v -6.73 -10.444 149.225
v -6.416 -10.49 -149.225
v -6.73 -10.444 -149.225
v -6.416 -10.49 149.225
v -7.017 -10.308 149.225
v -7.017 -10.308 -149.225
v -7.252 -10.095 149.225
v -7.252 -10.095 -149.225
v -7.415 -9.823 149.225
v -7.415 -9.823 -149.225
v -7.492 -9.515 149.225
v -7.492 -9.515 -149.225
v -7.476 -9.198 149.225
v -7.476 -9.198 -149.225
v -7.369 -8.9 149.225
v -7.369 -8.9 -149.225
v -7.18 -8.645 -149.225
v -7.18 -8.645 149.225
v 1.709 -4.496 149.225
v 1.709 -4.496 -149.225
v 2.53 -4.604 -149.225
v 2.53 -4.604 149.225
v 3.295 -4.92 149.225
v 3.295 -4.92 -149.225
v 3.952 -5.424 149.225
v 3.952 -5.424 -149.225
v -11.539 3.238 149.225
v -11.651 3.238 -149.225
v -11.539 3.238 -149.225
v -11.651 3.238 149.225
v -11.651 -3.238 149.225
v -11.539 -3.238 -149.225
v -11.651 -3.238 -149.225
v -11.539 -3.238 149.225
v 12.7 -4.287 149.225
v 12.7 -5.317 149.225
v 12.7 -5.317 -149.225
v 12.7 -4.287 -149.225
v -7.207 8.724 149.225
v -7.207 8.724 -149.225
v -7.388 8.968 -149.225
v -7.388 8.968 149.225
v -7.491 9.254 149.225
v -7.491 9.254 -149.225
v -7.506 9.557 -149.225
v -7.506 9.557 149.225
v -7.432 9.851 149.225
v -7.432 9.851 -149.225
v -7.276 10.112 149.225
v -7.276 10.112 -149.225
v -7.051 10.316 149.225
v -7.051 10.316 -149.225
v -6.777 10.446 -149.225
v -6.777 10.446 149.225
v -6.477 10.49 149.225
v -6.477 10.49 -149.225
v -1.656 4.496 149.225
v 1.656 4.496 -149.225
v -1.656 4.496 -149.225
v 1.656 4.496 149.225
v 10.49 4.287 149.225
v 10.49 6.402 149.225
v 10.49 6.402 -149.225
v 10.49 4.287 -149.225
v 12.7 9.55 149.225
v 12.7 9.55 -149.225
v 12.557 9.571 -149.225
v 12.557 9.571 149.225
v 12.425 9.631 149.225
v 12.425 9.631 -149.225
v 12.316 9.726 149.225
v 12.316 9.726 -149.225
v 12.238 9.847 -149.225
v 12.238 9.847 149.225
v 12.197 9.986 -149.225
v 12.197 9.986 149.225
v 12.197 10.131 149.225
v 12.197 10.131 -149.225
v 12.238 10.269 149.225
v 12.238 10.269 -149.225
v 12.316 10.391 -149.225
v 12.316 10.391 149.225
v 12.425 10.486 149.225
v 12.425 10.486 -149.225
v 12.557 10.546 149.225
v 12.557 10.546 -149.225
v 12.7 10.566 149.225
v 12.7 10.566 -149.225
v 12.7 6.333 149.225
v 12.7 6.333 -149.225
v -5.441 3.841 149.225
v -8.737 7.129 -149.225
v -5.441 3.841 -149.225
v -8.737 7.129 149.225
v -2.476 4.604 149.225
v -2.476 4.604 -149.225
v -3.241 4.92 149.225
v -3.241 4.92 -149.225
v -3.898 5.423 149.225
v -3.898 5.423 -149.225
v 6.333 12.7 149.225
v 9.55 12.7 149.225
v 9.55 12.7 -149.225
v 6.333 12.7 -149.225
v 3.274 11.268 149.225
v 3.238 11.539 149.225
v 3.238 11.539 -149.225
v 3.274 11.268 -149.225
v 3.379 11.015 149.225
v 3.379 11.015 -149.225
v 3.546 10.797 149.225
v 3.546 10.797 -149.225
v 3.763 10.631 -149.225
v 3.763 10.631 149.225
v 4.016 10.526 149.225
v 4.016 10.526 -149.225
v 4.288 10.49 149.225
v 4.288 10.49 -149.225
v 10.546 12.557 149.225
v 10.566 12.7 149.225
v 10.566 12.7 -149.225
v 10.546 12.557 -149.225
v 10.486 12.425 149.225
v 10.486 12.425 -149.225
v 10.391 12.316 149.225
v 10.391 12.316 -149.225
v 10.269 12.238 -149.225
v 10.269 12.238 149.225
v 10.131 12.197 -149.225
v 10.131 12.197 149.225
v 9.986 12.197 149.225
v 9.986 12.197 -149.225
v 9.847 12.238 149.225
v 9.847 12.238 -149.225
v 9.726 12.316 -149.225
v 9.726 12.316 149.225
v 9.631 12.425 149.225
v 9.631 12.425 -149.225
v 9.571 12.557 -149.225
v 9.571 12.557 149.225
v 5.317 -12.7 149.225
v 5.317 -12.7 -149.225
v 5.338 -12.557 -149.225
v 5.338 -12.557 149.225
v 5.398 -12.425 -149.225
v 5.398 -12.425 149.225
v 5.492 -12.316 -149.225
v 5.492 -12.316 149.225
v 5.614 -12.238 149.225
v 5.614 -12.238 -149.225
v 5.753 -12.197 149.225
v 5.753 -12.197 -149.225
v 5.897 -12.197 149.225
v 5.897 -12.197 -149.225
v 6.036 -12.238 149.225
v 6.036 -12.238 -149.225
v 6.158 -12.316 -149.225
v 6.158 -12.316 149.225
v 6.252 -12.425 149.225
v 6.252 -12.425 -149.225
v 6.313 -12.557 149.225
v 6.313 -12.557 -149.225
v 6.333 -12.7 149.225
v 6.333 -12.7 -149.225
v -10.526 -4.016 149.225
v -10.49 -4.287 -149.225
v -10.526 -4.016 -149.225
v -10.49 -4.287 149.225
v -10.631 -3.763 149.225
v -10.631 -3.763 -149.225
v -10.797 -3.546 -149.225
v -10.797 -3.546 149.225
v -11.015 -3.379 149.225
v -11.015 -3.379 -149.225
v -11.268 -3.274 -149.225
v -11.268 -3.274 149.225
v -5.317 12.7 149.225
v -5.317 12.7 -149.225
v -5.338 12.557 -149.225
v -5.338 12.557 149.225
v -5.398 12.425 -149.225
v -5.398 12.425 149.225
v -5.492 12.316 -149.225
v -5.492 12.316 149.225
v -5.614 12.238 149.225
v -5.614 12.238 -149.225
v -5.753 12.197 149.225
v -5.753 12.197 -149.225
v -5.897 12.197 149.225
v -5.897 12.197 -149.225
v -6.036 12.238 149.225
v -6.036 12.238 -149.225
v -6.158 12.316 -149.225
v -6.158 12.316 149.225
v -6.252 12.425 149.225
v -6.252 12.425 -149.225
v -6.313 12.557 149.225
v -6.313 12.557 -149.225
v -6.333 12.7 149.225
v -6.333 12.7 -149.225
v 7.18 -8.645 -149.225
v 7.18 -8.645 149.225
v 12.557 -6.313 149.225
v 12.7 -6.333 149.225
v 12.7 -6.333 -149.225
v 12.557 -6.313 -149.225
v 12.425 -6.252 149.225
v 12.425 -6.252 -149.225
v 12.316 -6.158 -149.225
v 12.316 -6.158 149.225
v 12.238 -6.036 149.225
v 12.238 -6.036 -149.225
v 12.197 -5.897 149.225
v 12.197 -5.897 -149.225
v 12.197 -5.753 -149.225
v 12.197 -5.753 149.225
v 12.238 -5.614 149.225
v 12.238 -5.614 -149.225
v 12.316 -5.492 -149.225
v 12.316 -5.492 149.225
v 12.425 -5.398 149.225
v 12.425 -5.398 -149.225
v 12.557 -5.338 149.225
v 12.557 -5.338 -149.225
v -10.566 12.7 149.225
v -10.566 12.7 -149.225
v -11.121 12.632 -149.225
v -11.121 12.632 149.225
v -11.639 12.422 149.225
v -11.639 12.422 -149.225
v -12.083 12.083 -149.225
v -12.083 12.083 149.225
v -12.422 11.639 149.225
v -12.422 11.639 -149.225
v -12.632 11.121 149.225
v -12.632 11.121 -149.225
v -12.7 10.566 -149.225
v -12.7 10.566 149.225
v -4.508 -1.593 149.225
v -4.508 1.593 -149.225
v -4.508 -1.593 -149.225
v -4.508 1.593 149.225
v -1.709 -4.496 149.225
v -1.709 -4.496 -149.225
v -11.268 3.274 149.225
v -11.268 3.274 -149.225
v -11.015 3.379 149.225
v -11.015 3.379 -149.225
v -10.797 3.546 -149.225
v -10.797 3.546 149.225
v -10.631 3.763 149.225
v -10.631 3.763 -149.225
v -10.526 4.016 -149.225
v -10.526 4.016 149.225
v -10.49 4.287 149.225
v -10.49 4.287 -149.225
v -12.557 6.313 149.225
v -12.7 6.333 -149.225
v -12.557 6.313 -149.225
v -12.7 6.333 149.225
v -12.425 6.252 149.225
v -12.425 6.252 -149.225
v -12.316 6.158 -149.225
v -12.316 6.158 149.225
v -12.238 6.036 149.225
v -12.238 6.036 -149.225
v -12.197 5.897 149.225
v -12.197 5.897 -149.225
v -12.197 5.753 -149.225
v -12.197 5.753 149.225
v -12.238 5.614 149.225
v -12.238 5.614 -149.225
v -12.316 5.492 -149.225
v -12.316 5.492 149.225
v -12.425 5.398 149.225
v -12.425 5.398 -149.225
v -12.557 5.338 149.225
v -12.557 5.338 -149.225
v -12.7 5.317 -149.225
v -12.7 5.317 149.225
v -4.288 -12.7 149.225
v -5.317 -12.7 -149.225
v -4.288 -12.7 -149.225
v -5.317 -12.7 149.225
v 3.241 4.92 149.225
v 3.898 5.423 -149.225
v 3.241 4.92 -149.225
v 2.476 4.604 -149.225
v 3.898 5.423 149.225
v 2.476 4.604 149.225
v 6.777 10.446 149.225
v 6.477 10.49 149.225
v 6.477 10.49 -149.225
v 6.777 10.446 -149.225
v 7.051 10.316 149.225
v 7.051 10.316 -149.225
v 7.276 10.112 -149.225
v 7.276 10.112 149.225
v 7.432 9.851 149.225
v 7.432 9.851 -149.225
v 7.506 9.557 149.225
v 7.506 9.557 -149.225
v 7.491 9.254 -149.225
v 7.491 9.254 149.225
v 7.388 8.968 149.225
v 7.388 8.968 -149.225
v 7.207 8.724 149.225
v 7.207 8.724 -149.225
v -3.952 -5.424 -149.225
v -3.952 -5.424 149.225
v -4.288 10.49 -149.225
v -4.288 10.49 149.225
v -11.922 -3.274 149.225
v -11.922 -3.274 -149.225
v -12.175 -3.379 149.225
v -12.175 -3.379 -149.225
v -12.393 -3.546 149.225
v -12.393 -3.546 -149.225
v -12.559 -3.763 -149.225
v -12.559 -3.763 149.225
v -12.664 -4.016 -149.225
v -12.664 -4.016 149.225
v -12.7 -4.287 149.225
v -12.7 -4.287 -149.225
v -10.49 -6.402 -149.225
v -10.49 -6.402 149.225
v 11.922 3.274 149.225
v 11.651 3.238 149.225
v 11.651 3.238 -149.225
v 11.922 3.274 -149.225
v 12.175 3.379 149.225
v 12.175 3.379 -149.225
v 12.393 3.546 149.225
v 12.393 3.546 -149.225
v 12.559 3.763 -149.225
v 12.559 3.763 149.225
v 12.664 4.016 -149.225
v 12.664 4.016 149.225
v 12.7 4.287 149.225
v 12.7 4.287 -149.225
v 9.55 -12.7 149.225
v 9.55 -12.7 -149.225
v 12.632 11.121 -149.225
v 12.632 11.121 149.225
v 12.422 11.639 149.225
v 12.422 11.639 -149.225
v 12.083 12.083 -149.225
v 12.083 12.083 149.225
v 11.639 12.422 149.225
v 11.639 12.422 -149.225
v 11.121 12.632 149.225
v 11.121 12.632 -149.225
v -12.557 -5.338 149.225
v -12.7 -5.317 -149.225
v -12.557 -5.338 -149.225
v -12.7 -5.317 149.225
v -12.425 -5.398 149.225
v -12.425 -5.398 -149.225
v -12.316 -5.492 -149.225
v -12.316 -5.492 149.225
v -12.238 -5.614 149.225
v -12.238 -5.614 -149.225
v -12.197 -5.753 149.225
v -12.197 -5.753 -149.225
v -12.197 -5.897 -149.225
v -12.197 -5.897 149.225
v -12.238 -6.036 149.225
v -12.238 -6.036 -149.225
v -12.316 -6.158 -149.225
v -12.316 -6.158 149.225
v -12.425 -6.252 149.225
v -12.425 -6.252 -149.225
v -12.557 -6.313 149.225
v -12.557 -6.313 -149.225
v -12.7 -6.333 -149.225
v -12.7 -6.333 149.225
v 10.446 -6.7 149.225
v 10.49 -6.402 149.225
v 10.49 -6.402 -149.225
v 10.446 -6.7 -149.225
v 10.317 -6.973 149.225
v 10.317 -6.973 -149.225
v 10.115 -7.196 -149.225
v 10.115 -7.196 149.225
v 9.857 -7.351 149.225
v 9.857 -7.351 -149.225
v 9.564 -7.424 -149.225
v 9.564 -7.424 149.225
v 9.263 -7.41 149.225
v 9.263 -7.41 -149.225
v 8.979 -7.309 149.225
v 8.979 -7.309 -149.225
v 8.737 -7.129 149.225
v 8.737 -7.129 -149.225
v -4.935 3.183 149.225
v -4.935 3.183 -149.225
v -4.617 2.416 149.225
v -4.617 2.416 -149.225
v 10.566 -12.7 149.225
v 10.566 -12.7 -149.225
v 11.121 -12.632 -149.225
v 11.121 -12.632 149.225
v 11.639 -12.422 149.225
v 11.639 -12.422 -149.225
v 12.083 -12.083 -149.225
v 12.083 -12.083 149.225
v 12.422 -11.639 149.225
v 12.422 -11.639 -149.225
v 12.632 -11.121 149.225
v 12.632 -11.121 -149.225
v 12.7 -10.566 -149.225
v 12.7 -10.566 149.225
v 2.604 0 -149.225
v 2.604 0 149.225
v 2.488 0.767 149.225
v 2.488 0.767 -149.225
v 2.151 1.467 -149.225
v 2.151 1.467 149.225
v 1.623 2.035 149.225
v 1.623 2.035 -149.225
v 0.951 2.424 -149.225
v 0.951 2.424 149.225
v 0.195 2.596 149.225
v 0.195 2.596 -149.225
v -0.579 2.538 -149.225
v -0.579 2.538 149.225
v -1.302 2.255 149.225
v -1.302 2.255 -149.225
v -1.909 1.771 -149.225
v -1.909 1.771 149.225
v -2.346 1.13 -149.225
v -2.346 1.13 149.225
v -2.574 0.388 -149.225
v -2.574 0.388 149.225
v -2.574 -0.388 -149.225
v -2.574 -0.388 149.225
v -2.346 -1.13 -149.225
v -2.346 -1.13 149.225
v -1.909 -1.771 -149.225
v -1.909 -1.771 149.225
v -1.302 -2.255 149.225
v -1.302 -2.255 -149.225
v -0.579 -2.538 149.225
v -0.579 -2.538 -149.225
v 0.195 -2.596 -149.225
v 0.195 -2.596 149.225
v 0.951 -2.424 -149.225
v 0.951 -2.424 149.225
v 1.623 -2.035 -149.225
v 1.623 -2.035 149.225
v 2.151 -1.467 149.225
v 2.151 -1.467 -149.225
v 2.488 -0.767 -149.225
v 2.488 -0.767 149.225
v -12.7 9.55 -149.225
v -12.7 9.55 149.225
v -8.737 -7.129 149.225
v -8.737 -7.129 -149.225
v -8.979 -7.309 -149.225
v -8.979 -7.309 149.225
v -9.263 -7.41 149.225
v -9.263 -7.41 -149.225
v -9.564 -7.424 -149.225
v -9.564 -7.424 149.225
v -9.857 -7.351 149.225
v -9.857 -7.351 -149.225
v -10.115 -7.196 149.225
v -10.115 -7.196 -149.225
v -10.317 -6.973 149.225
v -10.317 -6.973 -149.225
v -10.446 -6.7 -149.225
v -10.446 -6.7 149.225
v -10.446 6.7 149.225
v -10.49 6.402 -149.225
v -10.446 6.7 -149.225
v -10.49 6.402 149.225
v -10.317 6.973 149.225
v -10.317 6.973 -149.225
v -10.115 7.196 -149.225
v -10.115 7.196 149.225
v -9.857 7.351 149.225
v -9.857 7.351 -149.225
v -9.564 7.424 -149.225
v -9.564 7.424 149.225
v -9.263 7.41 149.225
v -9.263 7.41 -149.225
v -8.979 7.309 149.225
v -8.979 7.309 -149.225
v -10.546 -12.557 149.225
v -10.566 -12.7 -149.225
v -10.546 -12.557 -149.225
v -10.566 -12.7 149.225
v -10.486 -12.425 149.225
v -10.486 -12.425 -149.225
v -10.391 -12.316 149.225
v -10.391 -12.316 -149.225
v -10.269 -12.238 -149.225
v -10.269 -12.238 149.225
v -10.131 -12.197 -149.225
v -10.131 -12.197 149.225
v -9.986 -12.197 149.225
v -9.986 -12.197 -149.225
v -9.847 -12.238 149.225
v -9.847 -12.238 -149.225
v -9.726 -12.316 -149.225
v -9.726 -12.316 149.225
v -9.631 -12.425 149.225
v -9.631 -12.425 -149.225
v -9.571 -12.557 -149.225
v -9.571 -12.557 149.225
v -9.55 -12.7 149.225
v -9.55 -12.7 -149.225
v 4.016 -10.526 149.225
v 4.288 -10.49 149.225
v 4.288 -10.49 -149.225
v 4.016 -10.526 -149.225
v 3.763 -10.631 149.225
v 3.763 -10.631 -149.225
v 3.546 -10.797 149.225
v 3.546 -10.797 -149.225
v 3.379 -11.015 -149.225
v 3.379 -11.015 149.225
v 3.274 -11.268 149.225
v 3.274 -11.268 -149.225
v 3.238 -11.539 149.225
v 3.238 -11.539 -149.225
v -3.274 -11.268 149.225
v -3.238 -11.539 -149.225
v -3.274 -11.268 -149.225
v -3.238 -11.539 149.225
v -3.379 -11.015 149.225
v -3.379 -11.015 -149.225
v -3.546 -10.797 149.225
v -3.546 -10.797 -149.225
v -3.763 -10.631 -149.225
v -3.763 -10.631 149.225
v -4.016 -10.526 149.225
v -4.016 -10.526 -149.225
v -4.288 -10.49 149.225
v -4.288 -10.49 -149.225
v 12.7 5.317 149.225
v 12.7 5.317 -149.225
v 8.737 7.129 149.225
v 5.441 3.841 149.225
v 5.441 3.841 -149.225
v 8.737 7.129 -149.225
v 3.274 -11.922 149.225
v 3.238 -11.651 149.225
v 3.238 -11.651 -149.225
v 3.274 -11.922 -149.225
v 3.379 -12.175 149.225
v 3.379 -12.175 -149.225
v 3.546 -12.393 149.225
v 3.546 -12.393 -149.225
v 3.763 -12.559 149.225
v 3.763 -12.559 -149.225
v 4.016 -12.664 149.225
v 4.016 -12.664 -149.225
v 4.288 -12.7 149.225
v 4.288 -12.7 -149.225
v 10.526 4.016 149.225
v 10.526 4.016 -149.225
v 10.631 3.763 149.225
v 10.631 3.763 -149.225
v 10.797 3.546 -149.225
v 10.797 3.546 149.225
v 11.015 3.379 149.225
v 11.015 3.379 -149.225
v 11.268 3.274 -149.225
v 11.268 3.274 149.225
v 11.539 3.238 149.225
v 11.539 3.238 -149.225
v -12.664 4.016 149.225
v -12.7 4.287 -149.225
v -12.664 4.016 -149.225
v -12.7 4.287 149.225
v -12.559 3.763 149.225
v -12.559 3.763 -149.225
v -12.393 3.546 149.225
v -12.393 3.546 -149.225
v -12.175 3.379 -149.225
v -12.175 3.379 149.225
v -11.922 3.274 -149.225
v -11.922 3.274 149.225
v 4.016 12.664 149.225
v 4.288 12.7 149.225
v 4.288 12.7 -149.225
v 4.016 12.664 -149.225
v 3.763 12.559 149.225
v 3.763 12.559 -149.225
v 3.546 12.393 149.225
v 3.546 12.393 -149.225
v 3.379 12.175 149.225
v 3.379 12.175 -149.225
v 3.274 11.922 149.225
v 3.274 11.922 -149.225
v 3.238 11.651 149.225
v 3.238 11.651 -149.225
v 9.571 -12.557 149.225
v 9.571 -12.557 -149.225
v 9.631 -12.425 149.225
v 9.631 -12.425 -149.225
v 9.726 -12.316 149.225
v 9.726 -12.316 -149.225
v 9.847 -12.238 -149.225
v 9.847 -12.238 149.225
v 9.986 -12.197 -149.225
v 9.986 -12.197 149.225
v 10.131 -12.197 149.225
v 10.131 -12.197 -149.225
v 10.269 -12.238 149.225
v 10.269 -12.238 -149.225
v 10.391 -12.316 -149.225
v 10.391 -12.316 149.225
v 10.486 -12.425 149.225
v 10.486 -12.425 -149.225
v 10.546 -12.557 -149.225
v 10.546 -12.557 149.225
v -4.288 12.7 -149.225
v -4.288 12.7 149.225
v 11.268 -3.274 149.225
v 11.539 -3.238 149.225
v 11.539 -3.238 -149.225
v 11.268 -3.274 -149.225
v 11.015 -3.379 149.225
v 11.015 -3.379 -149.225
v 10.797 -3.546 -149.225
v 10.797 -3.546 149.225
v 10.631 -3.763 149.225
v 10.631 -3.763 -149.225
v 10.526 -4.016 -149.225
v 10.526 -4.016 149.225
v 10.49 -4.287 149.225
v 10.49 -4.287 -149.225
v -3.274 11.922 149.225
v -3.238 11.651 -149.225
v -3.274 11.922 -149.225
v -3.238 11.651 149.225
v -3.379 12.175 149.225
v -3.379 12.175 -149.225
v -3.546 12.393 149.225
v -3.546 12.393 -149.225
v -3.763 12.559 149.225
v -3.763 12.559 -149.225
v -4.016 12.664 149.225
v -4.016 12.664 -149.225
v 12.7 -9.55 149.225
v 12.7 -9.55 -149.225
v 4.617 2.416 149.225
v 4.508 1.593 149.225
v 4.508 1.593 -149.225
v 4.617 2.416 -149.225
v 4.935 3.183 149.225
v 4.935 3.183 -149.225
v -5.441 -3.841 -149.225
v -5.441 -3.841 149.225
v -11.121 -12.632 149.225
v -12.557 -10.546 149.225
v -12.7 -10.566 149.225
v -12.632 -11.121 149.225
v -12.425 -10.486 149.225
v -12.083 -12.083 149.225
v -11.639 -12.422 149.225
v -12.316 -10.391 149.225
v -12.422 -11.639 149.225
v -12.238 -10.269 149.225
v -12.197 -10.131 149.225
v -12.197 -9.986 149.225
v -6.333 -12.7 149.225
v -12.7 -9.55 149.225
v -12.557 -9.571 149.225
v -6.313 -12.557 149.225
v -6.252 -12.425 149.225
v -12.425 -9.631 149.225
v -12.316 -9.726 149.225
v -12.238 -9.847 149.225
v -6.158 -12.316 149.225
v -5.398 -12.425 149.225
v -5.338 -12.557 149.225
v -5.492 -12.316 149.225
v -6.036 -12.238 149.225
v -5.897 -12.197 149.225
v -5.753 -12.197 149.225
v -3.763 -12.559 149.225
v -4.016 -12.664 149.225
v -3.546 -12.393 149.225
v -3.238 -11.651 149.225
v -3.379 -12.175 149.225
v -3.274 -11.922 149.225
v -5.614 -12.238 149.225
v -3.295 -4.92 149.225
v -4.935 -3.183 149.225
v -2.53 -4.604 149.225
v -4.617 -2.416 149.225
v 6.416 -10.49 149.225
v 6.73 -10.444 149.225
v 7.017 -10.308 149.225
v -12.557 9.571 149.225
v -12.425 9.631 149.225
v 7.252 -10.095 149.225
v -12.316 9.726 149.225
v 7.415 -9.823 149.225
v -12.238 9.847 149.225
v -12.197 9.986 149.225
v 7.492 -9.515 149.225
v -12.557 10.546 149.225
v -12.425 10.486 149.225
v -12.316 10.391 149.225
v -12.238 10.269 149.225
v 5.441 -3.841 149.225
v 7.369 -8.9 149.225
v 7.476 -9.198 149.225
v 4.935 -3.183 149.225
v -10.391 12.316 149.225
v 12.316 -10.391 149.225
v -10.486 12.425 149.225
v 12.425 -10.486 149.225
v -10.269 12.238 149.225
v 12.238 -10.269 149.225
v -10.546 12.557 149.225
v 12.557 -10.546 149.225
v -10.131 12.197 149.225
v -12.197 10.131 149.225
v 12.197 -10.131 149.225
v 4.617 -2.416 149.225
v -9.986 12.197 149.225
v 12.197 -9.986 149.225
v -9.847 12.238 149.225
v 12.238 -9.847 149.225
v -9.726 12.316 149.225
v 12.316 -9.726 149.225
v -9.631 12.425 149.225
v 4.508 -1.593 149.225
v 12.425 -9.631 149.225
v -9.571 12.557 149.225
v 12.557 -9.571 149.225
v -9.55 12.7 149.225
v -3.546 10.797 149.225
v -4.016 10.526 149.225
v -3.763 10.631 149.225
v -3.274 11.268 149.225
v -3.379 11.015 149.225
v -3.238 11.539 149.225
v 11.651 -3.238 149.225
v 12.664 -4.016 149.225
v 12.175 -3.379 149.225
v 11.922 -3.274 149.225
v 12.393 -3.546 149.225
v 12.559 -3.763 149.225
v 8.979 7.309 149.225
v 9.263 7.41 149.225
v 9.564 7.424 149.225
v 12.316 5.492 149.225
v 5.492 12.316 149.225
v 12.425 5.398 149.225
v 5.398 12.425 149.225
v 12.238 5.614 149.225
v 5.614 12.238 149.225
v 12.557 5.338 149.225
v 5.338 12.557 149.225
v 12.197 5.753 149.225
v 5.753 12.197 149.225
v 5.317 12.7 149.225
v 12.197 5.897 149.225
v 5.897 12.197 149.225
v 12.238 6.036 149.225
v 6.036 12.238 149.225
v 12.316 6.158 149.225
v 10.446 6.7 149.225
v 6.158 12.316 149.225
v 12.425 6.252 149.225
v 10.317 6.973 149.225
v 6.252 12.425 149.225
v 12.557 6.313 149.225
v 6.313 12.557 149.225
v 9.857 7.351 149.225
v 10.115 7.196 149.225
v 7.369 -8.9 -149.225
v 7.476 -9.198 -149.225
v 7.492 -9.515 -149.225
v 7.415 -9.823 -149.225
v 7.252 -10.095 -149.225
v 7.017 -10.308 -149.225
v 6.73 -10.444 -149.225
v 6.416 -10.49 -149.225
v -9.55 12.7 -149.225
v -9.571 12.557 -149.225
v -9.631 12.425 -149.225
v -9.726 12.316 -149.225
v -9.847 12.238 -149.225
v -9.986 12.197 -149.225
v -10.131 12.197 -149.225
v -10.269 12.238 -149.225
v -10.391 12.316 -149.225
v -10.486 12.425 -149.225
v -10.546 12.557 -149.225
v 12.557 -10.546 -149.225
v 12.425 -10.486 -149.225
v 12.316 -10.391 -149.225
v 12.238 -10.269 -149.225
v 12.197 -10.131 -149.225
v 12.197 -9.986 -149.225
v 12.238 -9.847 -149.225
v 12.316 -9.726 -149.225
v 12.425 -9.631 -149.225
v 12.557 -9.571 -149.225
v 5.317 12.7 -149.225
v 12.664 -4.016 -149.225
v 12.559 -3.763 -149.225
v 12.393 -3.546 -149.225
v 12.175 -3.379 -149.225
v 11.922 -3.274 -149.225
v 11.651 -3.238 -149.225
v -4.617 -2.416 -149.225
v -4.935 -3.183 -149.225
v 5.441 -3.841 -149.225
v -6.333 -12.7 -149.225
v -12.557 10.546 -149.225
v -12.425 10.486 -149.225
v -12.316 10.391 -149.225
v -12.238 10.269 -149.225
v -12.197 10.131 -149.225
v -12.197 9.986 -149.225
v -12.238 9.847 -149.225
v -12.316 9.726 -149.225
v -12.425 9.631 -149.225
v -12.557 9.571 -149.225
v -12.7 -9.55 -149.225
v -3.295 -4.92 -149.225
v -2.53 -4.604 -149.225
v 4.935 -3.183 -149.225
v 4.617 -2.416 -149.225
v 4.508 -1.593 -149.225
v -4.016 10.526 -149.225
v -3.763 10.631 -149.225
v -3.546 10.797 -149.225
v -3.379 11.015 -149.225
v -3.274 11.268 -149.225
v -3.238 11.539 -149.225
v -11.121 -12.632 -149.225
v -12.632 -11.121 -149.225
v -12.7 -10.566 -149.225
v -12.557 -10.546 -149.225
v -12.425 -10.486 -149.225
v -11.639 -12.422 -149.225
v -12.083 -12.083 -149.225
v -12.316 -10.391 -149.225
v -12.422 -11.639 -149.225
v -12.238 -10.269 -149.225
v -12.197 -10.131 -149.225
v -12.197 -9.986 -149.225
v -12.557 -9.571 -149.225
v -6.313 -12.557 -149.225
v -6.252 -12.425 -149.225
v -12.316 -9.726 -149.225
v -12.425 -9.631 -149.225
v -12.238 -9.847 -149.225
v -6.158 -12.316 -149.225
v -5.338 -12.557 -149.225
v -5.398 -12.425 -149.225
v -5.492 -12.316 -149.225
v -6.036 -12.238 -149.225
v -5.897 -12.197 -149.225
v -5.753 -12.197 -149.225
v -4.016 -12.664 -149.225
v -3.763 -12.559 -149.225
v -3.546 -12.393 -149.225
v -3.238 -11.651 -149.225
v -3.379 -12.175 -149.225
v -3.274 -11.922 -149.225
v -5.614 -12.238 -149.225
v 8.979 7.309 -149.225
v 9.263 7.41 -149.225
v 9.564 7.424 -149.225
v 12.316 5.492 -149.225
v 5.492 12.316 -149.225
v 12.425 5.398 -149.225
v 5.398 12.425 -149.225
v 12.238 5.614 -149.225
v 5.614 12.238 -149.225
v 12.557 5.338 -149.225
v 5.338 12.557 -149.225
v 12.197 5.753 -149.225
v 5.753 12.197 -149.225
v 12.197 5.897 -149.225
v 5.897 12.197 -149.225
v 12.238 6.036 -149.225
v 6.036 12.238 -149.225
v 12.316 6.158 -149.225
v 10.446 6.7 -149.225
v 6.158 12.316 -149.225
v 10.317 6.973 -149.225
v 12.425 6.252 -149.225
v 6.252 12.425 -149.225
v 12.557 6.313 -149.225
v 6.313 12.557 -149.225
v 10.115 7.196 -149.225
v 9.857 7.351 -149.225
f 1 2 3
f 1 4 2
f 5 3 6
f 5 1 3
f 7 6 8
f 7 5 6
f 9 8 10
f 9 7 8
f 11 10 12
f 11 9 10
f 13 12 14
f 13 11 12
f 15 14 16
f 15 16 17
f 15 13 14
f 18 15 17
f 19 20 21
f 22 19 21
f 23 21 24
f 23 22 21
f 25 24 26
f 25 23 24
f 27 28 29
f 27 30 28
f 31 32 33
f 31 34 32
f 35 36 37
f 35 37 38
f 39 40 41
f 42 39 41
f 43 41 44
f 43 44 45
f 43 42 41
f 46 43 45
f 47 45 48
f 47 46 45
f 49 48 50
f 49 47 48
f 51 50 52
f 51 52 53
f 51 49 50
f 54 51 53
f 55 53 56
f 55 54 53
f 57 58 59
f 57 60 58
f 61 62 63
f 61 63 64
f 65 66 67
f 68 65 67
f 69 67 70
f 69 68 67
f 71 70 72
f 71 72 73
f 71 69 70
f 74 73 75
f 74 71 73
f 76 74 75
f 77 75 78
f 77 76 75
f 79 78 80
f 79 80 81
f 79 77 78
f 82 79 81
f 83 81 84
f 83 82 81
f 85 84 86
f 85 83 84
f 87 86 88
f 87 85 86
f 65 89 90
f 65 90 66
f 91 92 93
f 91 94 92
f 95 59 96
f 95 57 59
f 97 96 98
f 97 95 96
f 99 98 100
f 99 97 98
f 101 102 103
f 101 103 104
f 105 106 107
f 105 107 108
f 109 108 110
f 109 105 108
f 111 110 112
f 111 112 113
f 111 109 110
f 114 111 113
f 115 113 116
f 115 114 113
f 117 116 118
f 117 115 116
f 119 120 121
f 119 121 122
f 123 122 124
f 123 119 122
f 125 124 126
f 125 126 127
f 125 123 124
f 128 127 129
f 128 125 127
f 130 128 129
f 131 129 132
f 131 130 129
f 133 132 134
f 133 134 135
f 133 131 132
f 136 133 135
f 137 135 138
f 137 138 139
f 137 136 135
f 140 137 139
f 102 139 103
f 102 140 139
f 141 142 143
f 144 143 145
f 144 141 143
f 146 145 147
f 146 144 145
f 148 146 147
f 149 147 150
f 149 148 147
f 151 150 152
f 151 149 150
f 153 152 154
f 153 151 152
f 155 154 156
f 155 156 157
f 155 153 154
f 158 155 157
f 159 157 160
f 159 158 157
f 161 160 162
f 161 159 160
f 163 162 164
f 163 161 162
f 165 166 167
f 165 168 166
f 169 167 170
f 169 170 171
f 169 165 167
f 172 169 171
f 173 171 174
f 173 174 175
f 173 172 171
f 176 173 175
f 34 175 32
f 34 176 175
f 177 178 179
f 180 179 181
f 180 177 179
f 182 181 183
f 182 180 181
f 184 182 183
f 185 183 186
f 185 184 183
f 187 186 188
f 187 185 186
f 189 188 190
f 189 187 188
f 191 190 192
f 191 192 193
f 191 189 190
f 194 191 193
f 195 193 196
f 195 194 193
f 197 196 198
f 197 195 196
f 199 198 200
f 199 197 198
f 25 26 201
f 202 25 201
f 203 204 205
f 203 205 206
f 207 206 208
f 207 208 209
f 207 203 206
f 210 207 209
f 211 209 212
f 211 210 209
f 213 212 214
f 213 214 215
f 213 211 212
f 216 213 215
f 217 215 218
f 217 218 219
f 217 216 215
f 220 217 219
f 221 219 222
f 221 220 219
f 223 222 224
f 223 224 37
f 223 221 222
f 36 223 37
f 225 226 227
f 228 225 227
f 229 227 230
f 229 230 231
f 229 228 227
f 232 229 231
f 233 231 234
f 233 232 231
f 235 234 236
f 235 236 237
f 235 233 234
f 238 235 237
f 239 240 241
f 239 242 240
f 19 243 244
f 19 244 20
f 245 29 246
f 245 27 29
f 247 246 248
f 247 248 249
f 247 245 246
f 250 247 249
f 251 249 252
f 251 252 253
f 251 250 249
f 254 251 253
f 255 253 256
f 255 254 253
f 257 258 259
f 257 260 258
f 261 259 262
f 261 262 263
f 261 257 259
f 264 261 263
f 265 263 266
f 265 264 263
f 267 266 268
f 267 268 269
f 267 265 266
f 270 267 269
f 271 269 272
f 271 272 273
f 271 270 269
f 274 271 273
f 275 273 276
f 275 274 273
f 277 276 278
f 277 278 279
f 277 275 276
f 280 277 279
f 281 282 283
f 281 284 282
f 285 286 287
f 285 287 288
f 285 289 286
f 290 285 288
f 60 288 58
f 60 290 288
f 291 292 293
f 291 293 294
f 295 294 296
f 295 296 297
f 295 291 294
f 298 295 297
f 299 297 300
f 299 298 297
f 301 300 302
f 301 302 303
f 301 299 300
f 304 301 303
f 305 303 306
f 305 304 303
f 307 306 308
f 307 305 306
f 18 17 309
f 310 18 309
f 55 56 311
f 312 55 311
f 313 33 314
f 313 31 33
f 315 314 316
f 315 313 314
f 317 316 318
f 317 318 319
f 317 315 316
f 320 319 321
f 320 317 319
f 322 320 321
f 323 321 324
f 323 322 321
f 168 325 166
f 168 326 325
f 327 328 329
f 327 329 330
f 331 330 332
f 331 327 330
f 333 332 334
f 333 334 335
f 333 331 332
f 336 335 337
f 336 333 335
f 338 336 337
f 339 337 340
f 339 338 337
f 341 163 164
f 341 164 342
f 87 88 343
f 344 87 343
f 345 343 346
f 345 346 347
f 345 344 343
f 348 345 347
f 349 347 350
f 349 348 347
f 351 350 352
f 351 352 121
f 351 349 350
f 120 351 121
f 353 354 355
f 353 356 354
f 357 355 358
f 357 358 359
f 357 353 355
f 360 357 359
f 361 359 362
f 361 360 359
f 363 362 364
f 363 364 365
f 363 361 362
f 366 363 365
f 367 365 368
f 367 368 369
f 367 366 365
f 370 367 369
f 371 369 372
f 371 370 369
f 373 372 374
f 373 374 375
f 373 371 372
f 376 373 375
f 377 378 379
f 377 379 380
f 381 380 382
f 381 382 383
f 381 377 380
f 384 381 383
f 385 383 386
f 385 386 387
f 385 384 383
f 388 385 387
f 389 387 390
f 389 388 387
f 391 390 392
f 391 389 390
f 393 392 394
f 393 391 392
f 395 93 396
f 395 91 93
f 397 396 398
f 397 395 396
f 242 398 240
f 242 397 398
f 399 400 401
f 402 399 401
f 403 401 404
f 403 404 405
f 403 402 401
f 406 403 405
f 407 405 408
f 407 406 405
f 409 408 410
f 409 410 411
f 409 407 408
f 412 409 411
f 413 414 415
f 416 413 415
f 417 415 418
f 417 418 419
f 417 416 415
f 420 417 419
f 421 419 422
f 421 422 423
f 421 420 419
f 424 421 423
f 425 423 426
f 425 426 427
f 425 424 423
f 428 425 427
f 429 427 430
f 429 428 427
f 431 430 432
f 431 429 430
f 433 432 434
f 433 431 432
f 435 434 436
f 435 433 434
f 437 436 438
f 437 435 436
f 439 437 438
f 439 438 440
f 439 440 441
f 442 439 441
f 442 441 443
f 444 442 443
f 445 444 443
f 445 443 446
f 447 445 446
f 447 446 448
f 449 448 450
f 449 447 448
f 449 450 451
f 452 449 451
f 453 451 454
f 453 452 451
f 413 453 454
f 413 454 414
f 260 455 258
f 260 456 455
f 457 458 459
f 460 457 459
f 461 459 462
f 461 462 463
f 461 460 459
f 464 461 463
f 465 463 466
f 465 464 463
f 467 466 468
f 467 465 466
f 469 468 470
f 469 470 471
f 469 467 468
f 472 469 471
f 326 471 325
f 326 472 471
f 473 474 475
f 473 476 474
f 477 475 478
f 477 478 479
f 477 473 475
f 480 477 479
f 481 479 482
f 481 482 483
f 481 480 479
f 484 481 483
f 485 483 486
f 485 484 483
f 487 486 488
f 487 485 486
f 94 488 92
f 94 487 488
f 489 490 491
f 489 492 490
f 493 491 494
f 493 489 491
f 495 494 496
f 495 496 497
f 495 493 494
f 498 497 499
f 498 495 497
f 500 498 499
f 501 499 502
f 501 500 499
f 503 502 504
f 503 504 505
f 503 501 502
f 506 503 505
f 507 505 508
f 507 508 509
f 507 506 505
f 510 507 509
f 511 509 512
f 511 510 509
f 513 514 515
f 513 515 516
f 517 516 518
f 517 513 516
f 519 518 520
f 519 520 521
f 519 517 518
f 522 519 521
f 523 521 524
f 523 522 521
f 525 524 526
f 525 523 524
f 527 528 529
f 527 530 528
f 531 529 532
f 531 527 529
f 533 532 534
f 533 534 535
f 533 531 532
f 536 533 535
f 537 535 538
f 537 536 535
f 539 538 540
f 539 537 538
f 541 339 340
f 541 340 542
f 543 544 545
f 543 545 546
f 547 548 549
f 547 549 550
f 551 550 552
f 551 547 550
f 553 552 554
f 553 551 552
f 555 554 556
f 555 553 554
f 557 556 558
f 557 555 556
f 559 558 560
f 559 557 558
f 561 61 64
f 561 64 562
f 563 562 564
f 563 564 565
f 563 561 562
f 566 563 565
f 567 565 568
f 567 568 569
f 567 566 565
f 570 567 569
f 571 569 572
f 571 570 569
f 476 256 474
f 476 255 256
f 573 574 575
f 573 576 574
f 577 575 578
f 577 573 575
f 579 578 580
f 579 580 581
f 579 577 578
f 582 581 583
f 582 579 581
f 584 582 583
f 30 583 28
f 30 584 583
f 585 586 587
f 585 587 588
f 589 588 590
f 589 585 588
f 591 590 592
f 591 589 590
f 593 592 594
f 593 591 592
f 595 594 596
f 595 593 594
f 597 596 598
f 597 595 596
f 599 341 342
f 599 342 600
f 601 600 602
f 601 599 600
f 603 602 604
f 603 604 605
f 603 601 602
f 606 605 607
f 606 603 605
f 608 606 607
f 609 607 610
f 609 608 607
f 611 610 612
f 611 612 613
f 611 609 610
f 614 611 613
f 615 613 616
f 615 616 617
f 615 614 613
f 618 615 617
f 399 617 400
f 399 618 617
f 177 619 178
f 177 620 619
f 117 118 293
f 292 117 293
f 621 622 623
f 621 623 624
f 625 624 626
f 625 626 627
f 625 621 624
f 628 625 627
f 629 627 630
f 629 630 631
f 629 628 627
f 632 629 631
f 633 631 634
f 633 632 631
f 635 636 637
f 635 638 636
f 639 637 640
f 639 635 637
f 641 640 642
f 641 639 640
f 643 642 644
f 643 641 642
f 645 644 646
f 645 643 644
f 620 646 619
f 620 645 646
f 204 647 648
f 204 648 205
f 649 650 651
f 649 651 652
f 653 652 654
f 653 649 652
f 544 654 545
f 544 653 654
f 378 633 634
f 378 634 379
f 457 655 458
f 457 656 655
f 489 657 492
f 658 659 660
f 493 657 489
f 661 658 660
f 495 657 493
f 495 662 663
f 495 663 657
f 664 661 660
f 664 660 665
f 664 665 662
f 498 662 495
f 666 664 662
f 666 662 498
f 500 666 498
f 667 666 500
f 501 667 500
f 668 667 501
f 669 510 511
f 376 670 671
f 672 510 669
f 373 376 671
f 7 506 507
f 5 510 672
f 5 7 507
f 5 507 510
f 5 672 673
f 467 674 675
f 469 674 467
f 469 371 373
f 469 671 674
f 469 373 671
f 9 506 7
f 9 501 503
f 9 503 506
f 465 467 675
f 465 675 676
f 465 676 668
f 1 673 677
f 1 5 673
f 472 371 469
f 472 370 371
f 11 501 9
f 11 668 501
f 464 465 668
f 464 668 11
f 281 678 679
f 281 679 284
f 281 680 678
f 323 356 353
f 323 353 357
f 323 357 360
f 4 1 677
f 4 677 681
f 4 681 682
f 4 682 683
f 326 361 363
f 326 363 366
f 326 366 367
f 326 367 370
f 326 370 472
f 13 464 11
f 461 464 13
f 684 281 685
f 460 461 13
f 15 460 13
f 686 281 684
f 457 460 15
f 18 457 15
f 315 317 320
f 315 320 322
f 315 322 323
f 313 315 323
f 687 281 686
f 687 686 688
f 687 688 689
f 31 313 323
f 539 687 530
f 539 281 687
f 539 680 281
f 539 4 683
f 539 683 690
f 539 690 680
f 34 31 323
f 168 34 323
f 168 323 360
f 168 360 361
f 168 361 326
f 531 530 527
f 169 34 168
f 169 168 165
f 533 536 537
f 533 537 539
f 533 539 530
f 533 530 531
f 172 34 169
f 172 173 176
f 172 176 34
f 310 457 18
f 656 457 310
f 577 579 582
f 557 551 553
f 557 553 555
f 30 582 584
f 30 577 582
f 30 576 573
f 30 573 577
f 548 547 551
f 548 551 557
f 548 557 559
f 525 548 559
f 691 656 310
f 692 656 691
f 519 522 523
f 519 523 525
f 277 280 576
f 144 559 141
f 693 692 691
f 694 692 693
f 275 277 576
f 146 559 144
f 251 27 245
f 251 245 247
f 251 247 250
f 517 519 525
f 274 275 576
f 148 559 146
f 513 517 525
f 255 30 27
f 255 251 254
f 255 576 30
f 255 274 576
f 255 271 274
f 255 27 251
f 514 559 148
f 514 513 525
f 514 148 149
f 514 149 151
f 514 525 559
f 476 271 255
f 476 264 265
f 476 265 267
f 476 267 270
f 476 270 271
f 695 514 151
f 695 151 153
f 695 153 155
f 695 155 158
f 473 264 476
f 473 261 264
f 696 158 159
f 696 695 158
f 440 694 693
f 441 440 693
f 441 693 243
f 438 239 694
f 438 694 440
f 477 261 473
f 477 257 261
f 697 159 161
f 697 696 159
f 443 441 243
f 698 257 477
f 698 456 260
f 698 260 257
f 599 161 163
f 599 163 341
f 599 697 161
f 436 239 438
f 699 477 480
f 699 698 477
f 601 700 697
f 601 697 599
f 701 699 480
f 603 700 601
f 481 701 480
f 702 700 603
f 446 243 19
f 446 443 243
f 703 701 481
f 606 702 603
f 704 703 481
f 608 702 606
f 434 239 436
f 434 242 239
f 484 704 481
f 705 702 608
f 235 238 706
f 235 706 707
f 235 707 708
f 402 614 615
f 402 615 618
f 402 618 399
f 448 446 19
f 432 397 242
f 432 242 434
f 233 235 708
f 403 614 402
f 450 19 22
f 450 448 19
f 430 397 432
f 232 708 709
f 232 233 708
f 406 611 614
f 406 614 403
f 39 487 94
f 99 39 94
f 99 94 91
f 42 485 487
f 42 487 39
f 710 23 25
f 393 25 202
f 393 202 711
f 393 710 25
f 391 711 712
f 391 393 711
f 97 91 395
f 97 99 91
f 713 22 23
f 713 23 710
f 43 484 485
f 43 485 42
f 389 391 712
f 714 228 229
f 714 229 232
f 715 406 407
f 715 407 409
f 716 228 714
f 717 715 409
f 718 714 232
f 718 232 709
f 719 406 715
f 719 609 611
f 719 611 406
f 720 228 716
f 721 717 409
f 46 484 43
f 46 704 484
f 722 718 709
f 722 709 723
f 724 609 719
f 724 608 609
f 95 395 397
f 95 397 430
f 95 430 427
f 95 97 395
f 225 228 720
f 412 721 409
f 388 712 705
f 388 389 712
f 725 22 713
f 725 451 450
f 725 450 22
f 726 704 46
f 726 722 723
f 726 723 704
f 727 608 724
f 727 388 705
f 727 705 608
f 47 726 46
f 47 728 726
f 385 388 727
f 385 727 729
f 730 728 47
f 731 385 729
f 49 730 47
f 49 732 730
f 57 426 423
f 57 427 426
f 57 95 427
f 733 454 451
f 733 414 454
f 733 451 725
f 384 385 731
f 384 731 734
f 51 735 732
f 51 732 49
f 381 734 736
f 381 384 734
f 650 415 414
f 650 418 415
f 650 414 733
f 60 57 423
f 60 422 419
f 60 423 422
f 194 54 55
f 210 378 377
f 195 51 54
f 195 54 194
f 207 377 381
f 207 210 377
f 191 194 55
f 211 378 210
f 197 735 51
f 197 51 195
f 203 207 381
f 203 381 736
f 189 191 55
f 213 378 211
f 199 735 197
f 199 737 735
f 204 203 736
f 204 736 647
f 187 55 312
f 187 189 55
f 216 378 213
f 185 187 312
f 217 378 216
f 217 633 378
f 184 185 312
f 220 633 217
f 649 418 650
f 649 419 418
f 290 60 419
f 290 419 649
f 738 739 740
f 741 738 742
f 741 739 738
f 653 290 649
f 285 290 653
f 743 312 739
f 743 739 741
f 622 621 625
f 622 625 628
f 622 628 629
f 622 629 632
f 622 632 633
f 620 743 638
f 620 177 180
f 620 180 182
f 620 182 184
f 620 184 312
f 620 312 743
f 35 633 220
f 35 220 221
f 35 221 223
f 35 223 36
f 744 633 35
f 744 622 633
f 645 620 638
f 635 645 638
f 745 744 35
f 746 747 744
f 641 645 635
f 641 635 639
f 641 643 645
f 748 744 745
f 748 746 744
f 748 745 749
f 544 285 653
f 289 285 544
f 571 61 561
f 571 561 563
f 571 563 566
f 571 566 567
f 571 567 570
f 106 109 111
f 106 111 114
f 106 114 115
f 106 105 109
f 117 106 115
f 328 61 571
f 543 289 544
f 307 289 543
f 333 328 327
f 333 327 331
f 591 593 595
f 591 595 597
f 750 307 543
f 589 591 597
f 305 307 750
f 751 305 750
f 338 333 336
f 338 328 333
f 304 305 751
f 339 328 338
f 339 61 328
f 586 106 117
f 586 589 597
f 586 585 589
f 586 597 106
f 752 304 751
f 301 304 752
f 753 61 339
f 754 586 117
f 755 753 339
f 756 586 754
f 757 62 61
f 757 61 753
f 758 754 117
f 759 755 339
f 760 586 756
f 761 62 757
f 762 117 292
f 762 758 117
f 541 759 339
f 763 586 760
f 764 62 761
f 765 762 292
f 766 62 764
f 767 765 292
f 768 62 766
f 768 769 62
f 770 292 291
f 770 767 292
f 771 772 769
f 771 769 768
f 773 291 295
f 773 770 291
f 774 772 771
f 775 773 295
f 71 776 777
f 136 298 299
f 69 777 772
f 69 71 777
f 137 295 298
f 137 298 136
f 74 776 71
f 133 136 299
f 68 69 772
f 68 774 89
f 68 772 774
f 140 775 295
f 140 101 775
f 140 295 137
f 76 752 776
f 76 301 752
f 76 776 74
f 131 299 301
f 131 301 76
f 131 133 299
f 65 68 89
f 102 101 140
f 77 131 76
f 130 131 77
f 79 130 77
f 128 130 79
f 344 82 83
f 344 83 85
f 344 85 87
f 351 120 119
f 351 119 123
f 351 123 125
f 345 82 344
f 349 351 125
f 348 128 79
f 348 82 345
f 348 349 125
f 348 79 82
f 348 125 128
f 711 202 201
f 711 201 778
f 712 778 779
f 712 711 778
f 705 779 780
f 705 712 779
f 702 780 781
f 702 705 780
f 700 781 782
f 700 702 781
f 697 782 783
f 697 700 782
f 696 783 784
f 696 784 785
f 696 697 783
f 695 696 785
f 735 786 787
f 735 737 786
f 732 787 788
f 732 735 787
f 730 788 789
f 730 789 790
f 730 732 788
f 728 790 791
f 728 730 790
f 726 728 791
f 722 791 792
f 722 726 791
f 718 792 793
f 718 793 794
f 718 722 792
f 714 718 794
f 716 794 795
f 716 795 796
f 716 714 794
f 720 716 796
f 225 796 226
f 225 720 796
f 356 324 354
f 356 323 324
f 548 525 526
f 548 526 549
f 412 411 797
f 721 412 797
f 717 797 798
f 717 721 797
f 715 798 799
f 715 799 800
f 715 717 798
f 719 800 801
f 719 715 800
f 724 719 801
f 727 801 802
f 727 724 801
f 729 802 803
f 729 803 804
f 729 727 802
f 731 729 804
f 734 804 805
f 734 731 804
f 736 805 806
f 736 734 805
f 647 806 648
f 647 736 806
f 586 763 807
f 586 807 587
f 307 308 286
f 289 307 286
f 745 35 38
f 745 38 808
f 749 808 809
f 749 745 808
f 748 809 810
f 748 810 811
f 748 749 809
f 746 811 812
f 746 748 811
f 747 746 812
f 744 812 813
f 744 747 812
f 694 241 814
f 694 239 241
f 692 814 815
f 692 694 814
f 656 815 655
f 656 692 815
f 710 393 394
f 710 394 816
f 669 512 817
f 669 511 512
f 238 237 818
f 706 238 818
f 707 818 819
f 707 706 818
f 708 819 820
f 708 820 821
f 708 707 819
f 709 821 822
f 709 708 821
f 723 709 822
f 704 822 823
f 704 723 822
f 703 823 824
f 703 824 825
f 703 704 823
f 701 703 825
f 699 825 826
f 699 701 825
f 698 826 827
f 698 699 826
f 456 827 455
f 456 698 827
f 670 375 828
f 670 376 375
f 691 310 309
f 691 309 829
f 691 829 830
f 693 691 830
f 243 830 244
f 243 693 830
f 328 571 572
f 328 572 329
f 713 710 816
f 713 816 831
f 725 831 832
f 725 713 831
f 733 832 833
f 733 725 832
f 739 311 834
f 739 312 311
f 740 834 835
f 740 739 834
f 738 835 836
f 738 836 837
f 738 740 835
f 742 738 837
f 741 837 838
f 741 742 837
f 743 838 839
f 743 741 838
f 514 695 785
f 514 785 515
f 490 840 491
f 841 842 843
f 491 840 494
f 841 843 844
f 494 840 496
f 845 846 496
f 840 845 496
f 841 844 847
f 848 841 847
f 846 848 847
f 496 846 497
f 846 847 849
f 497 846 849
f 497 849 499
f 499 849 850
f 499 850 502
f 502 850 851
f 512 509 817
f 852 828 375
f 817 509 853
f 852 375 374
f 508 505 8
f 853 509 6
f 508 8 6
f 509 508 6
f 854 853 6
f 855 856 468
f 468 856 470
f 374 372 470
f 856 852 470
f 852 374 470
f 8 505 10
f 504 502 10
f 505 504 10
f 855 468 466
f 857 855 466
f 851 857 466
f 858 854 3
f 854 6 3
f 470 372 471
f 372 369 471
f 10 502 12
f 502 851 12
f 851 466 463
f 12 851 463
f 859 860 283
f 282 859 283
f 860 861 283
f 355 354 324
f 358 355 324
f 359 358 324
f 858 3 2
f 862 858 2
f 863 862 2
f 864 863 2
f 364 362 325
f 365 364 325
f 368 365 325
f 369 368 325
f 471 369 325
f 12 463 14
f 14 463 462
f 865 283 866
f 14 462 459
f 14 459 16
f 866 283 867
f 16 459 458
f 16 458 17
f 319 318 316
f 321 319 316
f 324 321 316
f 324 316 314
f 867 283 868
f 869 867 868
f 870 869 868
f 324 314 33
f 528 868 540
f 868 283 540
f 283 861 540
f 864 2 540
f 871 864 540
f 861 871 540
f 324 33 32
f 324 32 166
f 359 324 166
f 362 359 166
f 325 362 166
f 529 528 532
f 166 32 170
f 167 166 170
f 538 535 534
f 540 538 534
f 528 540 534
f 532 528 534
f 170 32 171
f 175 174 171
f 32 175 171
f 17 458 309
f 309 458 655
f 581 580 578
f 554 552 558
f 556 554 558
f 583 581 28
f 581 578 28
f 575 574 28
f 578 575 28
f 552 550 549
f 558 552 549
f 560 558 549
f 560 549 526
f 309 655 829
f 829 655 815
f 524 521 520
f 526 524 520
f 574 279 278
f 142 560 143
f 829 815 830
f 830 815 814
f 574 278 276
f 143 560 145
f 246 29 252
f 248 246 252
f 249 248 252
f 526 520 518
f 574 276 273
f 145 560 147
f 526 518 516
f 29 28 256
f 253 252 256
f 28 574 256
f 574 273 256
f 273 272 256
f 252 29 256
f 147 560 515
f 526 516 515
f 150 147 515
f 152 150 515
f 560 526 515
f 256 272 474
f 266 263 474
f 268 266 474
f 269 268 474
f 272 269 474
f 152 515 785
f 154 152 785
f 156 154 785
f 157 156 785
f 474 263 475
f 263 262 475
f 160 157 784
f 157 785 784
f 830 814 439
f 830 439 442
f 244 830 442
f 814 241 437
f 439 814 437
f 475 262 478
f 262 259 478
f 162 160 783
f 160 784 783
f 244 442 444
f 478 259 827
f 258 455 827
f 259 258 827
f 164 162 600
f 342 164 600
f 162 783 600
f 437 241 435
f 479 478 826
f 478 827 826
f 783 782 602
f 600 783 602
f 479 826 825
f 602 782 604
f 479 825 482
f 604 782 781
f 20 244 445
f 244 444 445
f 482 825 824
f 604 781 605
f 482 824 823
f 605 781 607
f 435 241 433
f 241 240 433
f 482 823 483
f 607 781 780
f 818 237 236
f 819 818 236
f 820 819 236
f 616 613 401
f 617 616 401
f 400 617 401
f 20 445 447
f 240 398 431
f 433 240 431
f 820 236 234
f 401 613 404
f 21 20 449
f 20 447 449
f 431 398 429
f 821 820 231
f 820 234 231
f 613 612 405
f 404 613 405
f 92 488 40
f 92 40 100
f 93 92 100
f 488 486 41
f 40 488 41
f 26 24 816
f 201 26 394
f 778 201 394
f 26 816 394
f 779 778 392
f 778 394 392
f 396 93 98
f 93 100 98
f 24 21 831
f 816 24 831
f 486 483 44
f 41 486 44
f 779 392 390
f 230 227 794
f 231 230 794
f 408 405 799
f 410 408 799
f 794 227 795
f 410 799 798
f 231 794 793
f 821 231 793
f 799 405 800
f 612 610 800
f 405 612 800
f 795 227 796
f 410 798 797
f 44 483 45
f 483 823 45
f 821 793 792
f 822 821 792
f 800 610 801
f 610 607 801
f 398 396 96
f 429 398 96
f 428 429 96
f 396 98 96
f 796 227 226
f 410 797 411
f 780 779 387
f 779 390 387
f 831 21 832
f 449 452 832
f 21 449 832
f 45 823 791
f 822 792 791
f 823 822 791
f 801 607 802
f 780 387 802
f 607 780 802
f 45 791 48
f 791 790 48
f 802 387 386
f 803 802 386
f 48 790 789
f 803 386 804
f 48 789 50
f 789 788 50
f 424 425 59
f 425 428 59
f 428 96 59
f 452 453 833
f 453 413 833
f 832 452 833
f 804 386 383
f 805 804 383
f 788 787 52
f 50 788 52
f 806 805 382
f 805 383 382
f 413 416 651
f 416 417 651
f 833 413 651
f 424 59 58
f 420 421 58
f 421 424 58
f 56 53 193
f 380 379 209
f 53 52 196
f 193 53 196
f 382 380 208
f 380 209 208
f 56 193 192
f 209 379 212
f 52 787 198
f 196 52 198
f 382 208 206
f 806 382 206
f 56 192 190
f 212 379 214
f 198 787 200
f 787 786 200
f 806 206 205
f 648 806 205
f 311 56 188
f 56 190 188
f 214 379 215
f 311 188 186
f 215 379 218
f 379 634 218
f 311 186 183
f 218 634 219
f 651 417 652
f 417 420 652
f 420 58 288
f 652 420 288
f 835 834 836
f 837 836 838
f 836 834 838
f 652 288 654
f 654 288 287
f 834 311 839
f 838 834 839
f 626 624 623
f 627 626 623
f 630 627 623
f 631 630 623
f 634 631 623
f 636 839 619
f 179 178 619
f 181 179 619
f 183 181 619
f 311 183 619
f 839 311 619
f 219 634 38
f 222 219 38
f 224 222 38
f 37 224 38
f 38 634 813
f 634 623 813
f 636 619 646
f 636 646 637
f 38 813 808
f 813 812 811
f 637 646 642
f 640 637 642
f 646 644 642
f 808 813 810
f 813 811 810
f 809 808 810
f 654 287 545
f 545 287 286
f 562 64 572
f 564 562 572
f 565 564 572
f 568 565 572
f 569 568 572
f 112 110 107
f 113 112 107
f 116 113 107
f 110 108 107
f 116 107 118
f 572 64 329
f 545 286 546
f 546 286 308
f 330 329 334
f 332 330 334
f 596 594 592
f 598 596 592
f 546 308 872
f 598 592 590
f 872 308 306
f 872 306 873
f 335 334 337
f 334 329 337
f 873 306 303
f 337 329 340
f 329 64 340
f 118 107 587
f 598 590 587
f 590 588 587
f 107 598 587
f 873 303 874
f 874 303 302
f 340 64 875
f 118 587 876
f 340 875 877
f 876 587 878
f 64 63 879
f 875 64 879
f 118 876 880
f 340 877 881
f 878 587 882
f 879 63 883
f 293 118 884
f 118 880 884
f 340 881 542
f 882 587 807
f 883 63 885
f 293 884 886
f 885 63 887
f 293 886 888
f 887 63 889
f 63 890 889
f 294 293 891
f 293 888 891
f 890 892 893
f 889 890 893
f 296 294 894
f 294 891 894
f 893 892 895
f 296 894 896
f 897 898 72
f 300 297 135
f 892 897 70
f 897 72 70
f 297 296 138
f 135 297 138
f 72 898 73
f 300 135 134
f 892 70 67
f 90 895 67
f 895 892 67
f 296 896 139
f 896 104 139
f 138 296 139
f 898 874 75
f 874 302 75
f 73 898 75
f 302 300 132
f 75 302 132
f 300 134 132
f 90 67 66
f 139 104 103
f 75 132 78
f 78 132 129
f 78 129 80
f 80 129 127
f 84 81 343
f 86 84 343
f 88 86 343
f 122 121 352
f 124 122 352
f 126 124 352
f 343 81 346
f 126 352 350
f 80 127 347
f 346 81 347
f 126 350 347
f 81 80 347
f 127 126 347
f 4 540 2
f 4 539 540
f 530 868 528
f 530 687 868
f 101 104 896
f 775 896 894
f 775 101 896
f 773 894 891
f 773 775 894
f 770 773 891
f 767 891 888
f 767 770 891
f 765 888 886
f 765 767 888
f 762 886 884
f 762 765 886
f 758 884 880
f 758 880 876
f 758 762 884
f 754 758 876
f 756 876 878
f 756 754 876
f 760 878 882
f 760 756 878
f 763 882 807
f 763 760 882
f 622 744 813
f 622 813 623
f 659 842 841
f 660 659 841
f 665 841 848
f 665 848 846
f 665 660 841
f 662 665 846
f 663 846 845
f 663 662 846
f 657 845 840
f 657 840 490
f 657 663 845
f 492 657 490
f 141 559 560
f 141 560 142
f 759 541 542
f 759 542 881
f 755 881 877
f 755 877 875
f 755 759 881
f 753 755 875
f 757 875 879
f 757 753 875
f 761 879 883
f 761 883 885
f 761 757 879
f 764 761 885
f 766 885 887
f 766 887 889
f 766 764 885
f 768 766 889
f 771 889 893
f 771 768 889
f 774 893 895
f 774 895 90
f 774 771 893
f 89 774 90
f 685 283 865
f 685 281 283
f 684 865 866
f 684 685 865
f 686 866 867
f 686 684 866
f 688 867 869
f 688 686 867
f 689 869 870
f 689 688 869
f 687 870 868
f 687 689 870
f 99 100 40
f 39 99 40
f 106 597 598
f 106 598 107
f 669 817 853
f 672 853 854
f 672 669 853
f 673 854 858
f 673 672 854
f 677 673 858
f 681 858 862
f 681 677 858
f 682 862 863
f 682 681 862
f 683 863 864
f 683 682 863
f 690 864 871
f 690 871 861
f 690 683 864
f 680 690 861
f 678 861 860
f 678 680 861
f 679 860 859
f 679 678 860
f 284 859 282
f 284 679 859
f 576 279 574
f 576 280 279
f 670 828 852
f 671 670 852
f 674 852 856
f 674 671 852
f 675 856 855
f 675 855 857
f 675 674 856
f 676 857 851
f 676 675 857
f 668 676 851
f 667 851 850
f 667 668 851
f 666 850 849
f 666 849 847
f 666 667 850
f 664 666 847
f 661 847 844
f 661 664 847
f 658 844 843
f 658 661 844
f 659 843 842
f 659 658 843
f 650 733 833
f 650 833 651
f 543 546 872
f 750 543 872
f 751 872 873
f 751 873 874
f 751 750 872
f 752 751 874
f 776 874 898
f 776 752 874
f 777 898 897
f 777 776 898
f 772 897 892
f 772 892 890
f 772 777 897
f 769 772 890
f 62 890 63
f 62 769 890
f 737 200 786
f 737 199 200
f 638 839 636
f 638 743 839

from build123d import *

# Parameters (mm, degrees)
SKETCH1_R           = 2.6035
BOSS_EXTRUDE1_DEPTH = 149.225


with BuildPart() as part:
    # Sketch1 → Boss-Extrude1 (new body, symmetric)
    with BuildSketch(Plane.XY):
        with BuildLine():
            Line((-7.179650497, -8.645192506), (-3.952270251, -5.423690499))
            ThreePointArc((-3.952270251, -5.423690499), (-2.922936451, -4.736929036), (-1.709253557, -4.4958))
            Line((-1.709253557, -4.4958), (1.709253557, -4.4958))
            ThreePointArc((1.709253557, -4.4958), (2.922936451, -4.736929036), (3.952270251, -5.423690499))
            Line((3.952270251, -5.423690499), (7.179650497, -8.645192506))
            ThreePointArc((7.179650497, -8.645192506), (7.41473083, -9.822813117), (6.416408329, -10.4902))
            Line((6.416408329, -10.4902), (4.287512407, -10.4902))
            ThreePointArc((4.287512407, -10.4902), (3.54574862, -10.79744862), (3.2385, -11.539212407))
            Line((3.2385, -11.539212407), (3.2385, -11.650987593))
            ThreePointArc((3.2385, -11.650987593), (3.54574862, -12.39275138), (4.287512407, -12.7))
            Line((4.287512407, -12.7), (5.317126718, -12.7))
            ThreePointArc((5.317126718, -12.7), (5.825126718, -12.192), (6.333126718, -12.7))
            Line((6.333126718, -12.7), (9.550443118, -12.7))
            ThreePointArc((9.550443118, -12.7), (10.058366869, -12.192000006), (10.566443095, -12.699847501))
            ThreePointArc((10.566443095, -12.699847501), (12.082537762, -12.08250727), (12.699846982, -10.566399977))
            ThreePointArc((12.699846982, -10.566399977), (12.192000006, -10.058323491), (12.7, -9.5504))
            Line((12.7, -9.5504), (12.7, -6.3330836))
            ThreePointArc((12.7, -6.3330836), (12.192, -5.8250836), (12.7, -5.3170836))
            Line((12.7, -5.3170836), (12.7, -4.287469289))
            ThreePointArc((12.7, -4.287469289), (12.39275138, -3.545705502), (11.650987593, -3.238456882))
            Line((11.650987593, -3.238456882), (11.539212407, -3.238456882))
            ThreePointArc((11.539212407, -3.238456882), (10.79744862, -3.545705502), (10.4902, -4.287469289))
            Line((10.4902, -4.287469289), (10.4902, -6.402089023))
            ThreePointArc((10.4902, -6.402089023), (9.856505071, -7.351067942), (8.737131347, -7.129408934))
            Line((8.737131347, -7.129408934), (5.441005833, -3.840816462))
            ThreePointArc((5.441005833, -3.840816462), (4.750877967, -2.809883091), (4.5085, -1.593185507))
            Line((4.5085, -1.593185507), (4.5085, 1.593185507))
            ThreePointArc((4.5085, 1.593185507), (4.750877967, 2.809883091), (5.441005833, 3.840816462))
            Line((5.441005833, 3.840816462), (8.737131347, 7.129408934))
            ThreePointArc((8.737131347, 7.129408934), (9.856505071, 7.351067942), (10.4902, 6.402089023))
            Line((10.4902, 6.402089023), (10.4902, 4.287469289))
            ThreePointArc((10.4902, 4.287469289), (10.79744862, 3.545705502), (11.539212407, 3.238456882))
            Line((11.539212407, 3.238456882), (11.650987593, 3.238456882))
            ThreePointArc((11.650987593, 3.238456882), (12.39275138, 3.545705502), (12.7, 4.287469289))
            Line((12.7, 4.287469289), (12.7, 5.3170836))
            ThreePointArc((12.7, 5.3170836), (12.192, 5.8250836), (12.7, 6.3330836))
            Line((12.7, 6.3330836), (12.7, 9.5504))
            ThreePointArc((12.7, 9.5504), (12.192000006, 10.058323491), (12.699846982, 10.566399977))
            ThreePointArc((12.699846982, 10.566399977), (12.082537762, 12.08250727), (10.566443095, 12.699847501))
            ThreePointArc((10.566443095, 12.699847501), (10.058366869, 12.192000006), (9.550443118, 12.7))
            Line((9.550443118, 12.7), (6.333126718, 12.7))
            ThreePointArc((6.333126718, 12.7), (5.825126718, 12.192), (5.317126718, 12.7))
            Line((5.317126718, 12.7), (4.287512407, 12.7))
            ThreePointArc((4.287512407, 12.7), (3.54574862, 12.39275138), (3.2385, 11.650987593))
            Line((3.2385, 11.650987593), (3.2385, 11.539212407))
            ThreePointArc((3.2385, 11.539212407), (3.54574862, 10.79744862), (4.287512407, 10.4902))
            Line((4.287512407, 10.4902), (6.476788598, 10.4902))
            ThreePointArc((6.476788598, 10.4902), (7.432222385, 9.85140422), (7.207036008, 8.724370562))
            Line((7.207036008, 8.724370562), (3.898272566, 5.423169045))
            ThreePointArc((3.898272566, 5.423169045), (2.869120213, 4.736787962), (1.655778399, 4.4958))
            Line((1.655778399, 4.4958), (-1.655778399, 4.4958))
            ThreePointArc((-1.655778399, 4.4958), (-2.869120213, 4.736787962), (-3.898272566, 5.423169045))
            Line((-3.898272566, 5.423169045), (-7.207036008, 8.724370562))
            ThreePointArc((-7.207036008, 8.724370562), (-7.432222385, 9.85140422), (-6.476788598, 10.4902))
            Line((-6.476788598, 10.4902), (-4.287512407, 10.4902))
            ThreePointArc((-4.287512407, 10.4902), (-3.54574862, 10.79744862), (-3.2385, 11.539212407))
            Line((-3.2385, 11.539212407), (-3.2385, 11.650987593))
            ThreePointArc((-3.2385, 11.650987593), (-3.54574862, 12.39275138), (-4.287512407, 12.7))
            Line((-4.287512407, 12.7), (-5.317126718, 12.7))
            ThreePointArc((-5.317126718, 12.7), (-5.825126718, 12.192), (-6.333126718, 12.7))
            Line((-6.333126718, 12.7), (-9.550443118, 12.7))
            ThreePointArc((-9.550443118, 12.7), (-10.058366869, 12.192000006), (-10.566443095, 12.699847501))
            ThreePointArc((-10.566443095, 12.699847501), (-12.082537762, 12.08250727), (-12.699846982, 10.566399977))
            ThreePointArc((-12.699846982, 10.566399977), (-12.192000006, 10.058323491), (-12.7, 9.5504))
            Line((-12.7, 9.5504), (-12.7, 6.3330836))
            ThreePointArc((-12.7, 6.3330836), (-12.192, 5.8250836), (-12.7, 5.3170836))
            Line((-12.7, 5.3170836), (-12.7, 4.287469289))
            ThreePointArc((-12.7, 4.287469289), (-12.39275138, 3.545705502), (-11.650987593, 3.238456882))
            Line((-11.650987593, 3.238456882), (-11.539212407, 3.238456882))
            ThreePointArc((-11.539212407, 3.238456882), (-10.79744862, 3.545705502), (-10.4902, 4.287469289))
            Line((-10.4902, 4.287469289), (-10.4902, 6.402089023))
            ThreePointArc((-10.4902, 6.402089023), (-9.856505071, 7.351067942), (-8.737131347, 7.129408934))
            Line((-8.737131347, 7.129408934), (-5.441005833, 3.840816462))
            ThreePointArc((-5.441005833, 3.840816462), (-4.750877967, 2.809883091), (-4.5085, 1.593185507))
            Line((-4.5085, 1.593185507), (-4.5085, -1.593185507))
            ThreePointArc((-4.5085, -1.593185507), (-4.750877967, -2.809883091), (-5.441005833, -3.840816462))
            Line((-5.441005833, -3.840816462), (-8.737131347, -7.129408934))
            ThreePointArc((-8.737131347, -7.129408934), (-9.856505071, -7.351067942), (-10.4902, -6.402089023))
            Line((-10.4902, -6.402089023), (-10.4902, -4.287469289))
            ThreePointArc((-10.4902, -4.287469289), (-10.79744862, -3.545705502), (-11.539212407, -3.238456882))
            Line((-11.539212407, -3.238456882), (-11.650987593, -3.238456882))
            ThreePointArc((-11.650987593, -3.238456882), (-12.39275138, -3.545705502), (-12.7, -4.287469289))
            Line((-12.7, -4.287469289), (-12.7, -5.3170836))
            ThreePointArc((-12.7, -5.3170836), (-12.192, -5.8250836), (-12.7, -6.3330836))
            Line((-12.7, -6.3330836), (-12.7, -9.5504))
            ThreePointArc((-12.7, -9.5504), (-12.192000006, -10.058323491), (-12.699846982, -10.566399977))
            ThreePointArc((-12.699846982, -10.566399977), (-12.082537762, -12.08250727), (-10.566443095, -12.699847501))
            ThreePointArc((-10.566443095, -12.699847501), (-10.058366869, -12.192000006), (-9.550443118, -12.7))
            Line((-9.550443118, -12.7), (-6.333126718, -12.7))
            ThreePointArc((-6.333126718, -12.7), (-5.825126718, -12.192), (-5.317126718, -12.7))
            Line((-5.317126718, -12.7), (-4.287512407, -12.7))
            ThreePointArc((-4.287512407, -12.7), (-3.54574862, -12.39275138), (-3.2385, -11.650987593))
            Line((-3.2385, -11.650987593), (-3.2385, -11.539212407))
            ThreePointArc((-3.2385, -11.539212407), (-3.54574862, -10.79744862), (-4.287512407, -10.4902))
            Line((-4.287512407, -10.4902), (-6.416408329, -10.4902))
            ThreePointArc((-6.416408329, -10.4902), (-7.41473083, -9.822813117), (-7.179650497, -8.645192506))
        make_face()
        Circle(SKETCH1_R, mode=Mode.SUBTRACT)
    extrude(amount=BOSS_EXTRUDE1_DEPTH, both=True)


solid = part.part
